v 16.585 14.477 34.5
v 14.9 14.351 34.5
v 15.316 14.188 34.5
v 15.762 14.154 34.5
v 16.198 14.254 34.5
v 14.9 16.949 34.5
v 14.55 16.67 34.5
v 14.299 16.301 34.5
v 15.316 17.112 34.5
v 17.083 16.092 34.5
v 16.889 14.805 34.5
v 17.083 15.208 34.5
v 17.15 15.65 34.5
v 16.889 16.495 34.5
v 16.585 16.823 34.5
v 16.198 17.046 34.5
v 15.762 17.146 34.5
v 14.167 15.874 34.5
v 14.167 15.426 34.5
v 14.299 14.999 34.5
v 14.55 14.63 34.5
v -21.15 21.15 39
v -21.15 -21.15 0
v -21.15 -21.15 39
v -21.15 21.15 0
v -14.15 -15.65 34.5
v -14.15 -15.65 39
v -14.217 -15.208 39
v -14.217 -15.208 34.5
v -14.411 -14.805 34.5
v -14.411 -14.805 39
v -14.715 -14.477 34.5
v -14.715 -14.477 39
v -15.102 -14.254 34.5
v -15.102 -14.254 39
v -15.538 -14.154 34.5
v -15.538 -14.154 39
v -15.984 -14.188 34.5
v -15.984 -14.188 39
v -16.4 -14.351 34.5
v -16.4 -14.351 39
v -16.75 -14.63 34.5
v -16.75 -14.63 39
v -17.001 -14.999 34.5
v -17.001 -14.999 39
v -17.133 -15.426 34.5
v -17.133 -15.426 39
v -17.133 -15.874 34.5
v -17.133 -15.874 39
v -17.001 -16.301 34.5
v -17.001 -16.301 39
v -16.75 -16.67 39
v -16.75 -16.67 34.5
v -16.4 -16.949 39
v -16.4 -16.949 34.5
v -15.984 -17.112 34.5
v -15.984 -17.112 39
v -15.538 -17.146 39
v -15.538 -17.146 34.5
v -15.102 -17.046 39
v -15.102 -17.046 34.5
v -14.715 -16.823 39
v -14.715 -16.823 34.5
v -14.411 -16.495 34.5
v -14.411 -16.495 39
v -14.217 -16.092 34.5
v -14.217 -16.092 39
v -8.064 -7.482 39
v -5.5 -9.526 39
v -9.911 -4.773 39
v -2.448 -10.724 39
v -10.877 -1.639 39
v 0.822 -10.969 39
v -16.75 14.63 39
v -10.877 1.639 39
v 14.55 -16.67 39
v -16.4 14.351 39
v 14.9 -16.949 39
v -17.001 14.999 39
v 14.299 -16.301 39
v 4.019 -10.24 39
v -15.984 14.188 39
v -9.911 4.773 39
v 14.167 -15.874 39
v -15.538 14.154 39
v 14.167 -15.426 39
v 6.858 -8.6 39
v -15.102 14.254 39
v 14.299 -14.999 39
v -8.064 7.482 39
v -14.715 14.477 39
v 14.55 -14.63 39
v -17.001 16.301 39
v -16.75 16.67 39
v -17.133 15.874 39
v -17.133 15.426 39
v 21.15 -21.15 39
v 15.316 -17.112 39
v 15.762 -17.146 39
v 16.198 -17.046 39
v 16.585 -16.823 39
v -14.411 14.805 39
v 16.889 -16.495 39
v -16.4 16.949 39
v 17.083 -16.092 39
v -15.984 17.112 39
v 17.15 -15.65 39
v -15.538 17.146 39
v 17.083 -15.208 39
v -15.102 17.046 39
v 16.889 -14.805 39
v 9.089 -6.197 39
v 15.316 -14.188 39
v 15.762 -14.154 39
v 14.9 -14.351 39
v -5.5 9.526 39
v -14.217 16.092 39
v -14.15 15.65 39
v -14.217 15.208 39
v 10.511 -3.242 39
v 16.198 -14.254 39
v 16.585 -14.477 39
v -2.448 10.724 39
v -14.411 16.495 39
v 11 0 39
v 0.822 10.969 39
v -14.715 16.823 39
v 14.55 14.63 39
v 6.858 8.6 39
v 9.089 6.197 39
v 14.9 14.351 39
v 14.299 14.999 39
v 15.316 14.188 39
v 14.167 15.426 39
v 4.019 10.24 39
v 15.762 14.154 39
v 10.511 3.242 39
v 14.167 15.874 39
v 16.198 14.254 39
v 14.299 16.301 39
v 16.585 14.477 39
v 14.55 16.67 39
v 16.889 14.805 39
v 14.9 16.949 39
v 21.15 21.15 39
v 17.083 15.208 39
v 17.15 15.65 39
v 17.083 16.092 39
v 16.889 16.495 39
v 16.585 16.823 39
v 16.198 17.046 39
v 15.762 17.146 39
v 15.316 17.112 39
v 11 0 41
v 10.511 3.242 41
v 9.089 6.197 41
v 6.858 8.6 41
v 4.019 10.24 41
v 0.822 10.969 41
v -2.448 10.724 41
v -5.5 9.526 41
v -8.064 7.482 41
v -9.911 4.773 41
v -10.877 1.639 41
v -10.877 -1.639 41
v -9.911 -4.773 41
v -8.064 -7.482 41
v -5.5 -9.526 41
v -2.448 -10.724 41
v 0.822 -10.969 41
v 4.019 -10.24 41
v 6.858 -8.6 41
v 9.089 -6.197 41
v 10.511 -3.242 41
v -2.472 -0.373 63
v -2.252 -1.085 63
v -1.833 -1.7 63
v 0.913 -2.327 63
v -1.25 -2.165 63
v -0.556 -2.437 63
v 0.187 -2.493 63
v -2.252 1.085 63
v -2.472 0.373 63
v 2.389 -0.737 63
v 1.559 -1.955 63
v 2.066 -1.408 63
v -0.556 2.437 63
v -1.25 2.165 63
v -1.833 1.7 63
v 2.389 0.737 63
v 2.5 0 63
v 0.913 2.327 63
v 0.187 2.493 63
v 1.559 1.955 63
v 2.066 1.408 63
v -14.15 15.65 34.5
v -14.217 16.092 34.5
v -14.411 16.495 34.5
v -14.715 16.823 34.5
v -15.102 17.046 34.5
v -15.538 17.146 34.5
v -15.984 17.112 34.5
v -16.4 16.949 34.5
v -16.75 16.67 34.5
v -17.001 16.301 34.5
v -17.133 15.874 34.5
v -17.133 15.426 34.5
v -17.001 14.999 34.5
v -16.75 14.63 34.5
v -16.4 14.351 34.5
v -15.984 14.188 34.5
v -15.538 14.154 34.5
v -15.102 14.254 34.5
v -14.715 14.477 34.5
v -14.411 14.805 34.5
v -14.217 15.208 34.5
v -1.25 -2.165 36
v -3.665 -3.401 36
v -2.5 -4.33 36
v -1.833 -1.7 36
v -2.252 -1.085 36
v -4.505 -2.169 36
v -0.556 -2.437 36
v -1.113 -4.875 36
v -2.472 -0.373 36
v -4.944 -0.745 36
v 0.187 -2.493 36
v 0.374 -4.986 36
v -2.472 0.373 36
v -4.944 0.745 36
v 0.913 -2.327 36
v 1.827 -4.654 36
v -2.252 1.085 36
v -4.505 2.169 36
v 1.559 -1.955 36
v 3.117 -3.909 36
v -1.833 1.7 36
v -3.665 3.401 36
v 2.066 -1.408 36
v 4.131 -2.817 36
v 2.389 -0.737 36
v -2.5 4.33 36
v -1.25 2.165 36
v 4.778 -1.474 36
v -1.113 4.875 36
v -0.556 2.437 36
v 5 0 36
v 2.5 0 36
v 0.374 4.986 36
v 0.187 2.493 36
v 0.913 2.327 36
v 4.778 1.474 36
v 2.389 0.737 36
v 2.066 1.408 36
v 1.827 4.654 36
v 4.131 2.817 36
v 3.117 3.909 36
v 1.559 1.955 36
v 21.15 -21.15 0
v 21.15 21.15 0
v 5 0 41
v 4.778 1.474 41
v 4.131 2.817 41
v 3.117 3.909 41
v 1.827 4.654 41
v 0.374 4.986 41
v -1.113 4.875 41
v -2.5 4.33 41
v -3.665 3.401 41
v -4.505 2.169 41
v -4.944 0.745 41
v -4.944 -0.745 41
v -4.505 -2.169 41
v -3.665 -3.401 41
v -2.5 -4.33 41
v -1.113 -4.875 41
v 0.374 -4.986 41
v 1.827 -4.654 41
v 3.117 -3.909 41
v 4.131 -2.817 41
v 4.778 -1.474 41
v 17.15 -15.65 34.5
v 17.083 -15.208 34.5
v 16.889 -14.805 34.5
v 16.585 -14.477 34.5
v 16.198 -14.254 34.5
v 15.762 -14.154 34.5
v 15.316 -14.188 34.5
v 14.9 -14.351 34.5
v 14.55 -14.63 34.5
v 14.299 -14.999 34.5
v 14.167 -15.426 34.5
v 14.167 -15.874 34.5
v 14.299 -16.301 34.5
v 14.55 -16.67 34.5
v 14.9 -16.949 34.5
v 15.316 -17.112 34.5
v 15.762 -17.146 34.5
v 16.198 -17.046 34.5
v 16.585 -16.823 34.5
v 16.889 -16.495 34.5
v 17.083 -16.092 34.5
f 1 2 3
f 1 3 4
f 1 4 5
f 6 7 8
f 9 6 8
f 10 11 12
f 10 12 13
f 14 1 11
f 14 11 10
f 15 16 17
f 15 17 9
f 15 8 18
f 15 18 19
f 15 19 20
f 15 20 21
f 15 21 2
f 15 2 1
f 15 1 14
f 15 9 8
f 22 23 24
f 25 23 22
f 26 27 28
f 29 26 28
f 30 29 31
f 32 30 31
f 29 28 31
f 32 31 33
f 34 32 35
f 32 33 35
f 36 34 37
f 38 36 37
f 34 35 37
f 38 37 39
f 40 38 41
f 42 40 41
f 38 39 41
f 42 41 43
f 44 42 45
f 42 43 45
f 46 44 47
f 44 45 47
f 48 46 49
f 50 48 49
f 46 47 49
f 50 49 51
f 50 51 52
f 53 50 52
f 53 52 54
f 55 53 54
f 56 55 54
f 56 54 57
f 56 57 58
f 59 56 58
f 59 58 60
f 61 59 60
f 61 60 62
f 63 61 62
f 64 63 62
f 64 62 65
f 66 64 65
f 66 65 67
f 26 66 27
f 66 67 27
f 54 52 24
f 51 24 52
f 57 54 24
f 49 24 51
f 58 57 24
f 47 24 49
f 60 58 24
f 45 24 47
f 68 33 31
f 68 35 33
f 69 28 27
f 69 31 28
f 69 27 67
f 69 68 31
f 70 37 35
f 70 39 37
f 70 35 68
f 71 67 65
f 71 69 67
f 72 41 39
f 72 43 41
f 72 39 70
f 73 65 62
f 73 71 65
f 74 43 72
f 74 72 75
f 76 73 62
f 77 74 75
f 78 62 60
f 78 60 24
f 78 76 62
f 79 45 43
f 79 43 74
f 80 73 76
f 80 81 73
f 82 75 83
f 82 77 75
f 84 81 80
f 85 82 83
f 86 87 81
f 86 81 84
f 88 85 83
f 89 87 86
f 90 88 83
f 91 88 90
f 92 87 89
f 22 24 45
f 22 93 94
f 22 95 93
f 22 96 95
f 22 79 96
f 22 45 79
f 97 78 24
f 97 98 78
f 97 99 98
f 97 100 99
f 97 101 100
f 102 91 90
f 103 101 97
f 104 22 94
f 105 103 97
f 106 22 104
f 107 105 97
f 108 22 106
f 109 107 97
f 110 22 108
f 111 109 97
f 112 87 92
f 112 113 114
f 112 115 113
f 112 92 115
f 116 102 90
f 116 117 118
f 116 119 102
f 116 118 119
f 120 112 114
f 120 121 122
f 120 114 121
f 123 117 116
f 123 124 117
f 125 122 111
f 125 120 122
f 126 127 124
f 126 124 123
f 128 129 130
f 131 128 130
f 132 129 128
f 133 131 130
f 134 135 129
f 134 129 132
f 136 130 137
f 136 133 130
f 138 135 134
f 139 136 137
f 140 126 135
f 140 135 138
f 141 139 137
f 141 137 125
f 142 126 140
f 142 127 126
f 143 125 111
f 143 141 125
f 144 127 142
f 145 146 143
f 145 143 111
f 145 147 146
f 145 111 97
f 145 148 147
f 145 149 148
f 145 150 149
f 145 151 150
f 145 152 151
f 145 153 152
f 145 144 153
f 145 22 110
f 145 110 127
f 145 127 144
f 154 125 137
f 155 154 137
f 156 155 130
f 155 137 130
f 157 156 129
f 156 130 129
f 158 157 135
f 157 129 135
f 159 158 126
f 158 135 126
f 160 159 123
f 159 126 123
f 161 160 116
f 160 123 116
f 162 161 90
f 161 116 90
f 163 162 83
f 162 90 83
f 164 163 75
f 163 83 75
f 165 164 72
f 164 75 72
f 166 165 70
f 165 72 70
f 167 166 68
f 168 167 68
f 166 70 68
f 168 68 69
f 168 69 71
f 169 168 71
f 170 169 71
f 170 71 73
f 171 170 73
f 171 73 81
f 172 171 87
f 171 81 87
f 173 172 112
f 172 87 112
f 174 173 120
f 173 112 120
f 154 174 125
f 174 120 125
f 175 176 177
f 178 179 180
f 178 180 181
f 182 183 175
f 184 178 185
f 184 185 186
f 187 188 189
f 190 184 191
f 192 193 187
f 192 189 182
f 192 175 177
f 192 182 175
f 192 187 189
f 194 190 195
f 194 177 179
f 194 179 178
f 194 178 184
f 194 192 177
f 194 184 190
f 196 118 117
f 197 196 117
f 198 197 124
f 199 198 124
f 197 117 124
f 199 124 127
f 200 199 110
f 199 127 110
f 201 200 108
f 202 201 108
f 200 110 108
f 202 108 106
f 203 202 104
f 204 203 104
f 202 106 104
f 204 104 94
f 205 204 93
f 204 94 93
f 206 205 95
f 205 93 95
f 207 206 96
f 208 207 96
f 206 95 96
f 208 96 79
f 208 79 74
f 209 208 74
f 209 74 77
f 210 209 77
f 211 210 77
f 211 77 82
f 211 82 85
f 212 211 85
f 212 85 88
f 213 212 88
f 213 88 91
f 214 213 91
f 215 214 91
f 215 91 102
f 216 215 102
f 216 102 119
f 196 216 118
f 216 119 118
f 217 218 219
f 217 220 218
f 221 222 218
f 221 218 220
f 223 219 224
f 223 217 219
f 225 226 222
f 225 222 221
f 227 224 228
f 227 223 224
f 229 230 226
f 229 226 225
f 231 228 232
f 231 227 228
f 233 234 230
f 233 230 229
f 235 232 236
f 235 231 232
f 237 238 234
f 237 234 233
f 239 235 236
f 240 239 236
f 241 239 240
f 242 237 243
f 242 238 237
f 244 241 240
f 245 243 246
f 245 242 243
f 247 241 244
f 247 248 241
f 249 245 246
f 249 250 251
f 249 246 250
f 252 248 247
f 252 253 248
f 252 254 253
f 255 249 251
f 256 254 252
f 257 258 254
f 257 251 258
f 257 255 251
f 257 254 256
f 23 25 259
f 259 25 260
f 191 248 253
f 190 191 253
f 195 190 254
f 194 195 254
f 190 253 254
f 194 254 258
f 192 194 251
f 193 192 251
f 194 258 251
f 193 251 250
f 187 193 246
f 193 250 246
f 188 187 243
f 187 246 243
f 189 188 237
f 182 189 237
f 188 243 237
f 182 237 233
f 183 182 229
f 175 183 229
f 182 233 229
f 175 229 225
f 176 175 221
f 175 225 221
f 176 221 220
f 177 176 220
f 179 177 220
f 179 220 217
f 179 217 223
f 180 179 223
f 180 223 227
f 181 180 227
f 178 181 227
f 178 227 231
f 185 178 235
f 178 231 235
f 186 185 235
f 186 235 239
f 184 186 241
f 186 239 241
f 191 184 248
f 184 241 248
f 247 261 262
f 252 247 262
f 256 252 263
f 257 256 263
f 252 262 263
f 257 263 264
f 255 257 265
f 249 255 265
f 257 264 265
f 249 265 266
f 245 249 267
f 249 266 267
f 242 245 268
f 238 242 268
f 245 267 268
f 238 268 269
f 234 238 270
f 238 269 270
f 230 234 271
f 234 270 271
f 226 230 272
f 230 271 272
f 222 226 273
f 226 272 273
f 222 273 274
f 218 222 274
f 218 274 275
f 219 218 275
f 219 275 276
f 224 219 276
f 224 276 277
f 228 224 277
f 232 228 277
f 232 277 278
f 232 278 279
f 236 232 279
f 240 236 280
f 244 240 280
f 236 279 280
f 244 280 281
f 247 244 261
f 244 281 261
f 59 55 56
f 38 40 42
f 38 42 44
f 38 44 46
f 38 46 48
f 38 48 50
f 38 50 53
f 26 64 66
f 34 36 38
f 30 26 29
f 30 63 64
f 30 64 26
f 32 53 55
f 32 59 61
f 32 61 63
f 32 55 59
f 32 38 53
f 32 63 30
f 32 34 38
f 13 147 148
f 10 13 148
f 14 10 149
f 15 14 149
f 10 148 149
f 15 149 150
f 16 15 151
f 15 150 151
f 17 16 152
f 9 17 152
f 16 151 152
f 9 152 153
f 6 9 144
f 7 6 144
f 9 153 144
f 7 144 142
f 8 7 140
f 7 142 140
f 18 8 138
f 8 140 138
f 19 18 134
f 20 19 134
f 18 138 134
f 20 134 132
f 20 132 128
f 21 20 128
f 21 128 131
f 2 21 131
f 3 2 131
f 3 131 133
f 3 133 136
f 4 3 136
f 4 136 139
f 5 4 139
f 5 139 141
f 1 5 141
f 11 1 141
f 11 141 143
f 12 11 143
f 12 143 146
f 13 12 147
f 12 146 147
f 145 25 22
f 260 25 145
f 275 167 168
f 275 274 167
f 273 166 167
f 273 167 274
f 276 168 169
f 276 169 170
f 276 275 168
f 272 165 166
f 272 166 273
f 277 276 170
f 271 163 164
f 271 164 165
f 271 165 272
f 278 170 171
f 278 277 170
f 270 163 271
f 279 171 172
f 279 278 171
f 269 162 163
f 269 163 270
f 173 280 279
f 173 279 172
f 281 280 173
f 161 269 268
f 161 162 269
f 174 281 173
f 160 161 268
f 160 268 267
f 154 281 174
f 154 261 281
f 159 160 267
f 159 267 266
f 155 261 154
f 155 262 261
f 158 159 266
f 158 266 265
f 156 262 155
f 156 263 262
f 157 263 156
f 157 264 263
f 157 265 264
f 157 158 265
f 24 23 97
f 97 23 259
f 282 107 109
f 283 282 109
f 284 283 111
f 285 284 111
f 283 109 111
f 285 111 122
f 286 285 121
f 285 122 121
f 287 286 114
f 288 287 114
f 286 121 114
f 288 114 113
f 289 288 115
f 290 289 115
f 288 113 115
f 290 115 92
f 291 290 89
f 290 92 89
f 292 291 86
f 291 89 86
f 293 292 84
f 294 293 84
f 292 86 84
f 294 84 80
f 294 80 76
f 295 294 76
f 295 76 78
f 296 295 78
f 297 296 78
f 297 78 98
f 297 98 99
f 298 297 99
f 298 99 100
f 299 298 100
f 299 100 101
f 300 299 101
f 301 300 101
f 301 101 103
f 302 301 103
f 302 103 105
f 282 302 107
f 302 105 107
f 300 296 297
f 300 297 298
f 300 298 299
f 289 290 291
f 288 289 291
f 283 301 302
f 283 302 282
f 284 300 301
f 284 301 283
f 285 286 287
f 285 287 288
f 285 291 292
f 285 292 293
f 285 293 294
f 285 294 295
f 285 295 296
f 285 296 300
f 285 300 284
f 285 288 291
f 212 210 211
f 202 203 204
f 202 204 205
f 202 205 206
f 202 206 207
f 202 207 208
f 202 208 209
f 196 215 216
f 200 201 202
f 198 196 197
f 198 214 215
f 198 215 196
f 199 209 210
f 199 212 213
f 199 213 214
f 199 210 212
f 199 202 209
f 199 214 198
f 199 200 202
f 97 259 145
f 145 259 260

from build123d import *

# Parameters (mm, degrees)
F0_W      = 42.3
F0_H      = 42.3
F1_DEPTH  = 39
F2_R      = 11
F3_DEPTH  = 2
F4_R      = 1.5
F5_DEPTH  = 4.5
F6_R      = 1.5
F7_DEPTH  = 4.5
F8_R      = 1.5
F9_DEPTH  = 4.5
F10_R     = 1.5
F11_DEPTH = 4.5
F12_R     = 5
F13_DEPTH = 5
F14_R     = 2.5
F15_DEPTH = 27


with BuildPart() as f1:
    # F0 (on Top) → F1 (new body)
    with BuildSketch(Plane.XY):
        Rectangle(F0_W, F0_H)
    extrude(amount=F1_DEPTH)

    # F2 (on face) → F3 (join)
    with BuildSketch(Plane.XY.offset(39)):
        Circle(F2_R)
    extrude(amount=F3_DEPTH)

    # F4 (on face) → F5 (cut)
    with BuildSketch(Plane.XY.offset(39)):
        with Locations((15.65, 15.65)):
            Circle(F4_R)
    extrude(amount=-F5_DEPTH, mode=Mode.SUBTRACT)

    # F6 (on face) → F7 (cut)
    with BuildSketch(Plane.XY.offset(39)):
        with Locations((15.65, -15.65)):
            Circle(F6_R)
    extrude(amount=-F7_DEPTH, mode=Mode.SUBTRACT)

    # F8 (on face) → F9 (cut)
    with BuildSketch(Plane.XY.offset(39)):
        with Locations((-15.65, -15.65)):
            Circle(F8_R)
    extrude(amount=-F9_DEPTH, mode=Mode.SUBTRACT)

    # F10 (on face) → F11 (cut)
    with BuildSketch(Plane.XY.offset(39)):
        with Locations((-15.65, 15.65)):
            Circle(F10_R)
    extrude(amount=-F11_DEPTH, mode=Mode.SUBTRACT)

    # F12 (on face) → F13 (cut)
    with BuildSketch(Plane.XY.offset(41)):
        Circle(F12_R)
    extrude(amount=-F13_DEPTH, mode=Mode.SUBTRACT)

    # F14 (on face) → F15 (join)
    with BuildSketch(Plane.XY.offset(36)):
        Circle(F14_R)
    extrude(amount=F15_DEPTH)


solid = f1.part
